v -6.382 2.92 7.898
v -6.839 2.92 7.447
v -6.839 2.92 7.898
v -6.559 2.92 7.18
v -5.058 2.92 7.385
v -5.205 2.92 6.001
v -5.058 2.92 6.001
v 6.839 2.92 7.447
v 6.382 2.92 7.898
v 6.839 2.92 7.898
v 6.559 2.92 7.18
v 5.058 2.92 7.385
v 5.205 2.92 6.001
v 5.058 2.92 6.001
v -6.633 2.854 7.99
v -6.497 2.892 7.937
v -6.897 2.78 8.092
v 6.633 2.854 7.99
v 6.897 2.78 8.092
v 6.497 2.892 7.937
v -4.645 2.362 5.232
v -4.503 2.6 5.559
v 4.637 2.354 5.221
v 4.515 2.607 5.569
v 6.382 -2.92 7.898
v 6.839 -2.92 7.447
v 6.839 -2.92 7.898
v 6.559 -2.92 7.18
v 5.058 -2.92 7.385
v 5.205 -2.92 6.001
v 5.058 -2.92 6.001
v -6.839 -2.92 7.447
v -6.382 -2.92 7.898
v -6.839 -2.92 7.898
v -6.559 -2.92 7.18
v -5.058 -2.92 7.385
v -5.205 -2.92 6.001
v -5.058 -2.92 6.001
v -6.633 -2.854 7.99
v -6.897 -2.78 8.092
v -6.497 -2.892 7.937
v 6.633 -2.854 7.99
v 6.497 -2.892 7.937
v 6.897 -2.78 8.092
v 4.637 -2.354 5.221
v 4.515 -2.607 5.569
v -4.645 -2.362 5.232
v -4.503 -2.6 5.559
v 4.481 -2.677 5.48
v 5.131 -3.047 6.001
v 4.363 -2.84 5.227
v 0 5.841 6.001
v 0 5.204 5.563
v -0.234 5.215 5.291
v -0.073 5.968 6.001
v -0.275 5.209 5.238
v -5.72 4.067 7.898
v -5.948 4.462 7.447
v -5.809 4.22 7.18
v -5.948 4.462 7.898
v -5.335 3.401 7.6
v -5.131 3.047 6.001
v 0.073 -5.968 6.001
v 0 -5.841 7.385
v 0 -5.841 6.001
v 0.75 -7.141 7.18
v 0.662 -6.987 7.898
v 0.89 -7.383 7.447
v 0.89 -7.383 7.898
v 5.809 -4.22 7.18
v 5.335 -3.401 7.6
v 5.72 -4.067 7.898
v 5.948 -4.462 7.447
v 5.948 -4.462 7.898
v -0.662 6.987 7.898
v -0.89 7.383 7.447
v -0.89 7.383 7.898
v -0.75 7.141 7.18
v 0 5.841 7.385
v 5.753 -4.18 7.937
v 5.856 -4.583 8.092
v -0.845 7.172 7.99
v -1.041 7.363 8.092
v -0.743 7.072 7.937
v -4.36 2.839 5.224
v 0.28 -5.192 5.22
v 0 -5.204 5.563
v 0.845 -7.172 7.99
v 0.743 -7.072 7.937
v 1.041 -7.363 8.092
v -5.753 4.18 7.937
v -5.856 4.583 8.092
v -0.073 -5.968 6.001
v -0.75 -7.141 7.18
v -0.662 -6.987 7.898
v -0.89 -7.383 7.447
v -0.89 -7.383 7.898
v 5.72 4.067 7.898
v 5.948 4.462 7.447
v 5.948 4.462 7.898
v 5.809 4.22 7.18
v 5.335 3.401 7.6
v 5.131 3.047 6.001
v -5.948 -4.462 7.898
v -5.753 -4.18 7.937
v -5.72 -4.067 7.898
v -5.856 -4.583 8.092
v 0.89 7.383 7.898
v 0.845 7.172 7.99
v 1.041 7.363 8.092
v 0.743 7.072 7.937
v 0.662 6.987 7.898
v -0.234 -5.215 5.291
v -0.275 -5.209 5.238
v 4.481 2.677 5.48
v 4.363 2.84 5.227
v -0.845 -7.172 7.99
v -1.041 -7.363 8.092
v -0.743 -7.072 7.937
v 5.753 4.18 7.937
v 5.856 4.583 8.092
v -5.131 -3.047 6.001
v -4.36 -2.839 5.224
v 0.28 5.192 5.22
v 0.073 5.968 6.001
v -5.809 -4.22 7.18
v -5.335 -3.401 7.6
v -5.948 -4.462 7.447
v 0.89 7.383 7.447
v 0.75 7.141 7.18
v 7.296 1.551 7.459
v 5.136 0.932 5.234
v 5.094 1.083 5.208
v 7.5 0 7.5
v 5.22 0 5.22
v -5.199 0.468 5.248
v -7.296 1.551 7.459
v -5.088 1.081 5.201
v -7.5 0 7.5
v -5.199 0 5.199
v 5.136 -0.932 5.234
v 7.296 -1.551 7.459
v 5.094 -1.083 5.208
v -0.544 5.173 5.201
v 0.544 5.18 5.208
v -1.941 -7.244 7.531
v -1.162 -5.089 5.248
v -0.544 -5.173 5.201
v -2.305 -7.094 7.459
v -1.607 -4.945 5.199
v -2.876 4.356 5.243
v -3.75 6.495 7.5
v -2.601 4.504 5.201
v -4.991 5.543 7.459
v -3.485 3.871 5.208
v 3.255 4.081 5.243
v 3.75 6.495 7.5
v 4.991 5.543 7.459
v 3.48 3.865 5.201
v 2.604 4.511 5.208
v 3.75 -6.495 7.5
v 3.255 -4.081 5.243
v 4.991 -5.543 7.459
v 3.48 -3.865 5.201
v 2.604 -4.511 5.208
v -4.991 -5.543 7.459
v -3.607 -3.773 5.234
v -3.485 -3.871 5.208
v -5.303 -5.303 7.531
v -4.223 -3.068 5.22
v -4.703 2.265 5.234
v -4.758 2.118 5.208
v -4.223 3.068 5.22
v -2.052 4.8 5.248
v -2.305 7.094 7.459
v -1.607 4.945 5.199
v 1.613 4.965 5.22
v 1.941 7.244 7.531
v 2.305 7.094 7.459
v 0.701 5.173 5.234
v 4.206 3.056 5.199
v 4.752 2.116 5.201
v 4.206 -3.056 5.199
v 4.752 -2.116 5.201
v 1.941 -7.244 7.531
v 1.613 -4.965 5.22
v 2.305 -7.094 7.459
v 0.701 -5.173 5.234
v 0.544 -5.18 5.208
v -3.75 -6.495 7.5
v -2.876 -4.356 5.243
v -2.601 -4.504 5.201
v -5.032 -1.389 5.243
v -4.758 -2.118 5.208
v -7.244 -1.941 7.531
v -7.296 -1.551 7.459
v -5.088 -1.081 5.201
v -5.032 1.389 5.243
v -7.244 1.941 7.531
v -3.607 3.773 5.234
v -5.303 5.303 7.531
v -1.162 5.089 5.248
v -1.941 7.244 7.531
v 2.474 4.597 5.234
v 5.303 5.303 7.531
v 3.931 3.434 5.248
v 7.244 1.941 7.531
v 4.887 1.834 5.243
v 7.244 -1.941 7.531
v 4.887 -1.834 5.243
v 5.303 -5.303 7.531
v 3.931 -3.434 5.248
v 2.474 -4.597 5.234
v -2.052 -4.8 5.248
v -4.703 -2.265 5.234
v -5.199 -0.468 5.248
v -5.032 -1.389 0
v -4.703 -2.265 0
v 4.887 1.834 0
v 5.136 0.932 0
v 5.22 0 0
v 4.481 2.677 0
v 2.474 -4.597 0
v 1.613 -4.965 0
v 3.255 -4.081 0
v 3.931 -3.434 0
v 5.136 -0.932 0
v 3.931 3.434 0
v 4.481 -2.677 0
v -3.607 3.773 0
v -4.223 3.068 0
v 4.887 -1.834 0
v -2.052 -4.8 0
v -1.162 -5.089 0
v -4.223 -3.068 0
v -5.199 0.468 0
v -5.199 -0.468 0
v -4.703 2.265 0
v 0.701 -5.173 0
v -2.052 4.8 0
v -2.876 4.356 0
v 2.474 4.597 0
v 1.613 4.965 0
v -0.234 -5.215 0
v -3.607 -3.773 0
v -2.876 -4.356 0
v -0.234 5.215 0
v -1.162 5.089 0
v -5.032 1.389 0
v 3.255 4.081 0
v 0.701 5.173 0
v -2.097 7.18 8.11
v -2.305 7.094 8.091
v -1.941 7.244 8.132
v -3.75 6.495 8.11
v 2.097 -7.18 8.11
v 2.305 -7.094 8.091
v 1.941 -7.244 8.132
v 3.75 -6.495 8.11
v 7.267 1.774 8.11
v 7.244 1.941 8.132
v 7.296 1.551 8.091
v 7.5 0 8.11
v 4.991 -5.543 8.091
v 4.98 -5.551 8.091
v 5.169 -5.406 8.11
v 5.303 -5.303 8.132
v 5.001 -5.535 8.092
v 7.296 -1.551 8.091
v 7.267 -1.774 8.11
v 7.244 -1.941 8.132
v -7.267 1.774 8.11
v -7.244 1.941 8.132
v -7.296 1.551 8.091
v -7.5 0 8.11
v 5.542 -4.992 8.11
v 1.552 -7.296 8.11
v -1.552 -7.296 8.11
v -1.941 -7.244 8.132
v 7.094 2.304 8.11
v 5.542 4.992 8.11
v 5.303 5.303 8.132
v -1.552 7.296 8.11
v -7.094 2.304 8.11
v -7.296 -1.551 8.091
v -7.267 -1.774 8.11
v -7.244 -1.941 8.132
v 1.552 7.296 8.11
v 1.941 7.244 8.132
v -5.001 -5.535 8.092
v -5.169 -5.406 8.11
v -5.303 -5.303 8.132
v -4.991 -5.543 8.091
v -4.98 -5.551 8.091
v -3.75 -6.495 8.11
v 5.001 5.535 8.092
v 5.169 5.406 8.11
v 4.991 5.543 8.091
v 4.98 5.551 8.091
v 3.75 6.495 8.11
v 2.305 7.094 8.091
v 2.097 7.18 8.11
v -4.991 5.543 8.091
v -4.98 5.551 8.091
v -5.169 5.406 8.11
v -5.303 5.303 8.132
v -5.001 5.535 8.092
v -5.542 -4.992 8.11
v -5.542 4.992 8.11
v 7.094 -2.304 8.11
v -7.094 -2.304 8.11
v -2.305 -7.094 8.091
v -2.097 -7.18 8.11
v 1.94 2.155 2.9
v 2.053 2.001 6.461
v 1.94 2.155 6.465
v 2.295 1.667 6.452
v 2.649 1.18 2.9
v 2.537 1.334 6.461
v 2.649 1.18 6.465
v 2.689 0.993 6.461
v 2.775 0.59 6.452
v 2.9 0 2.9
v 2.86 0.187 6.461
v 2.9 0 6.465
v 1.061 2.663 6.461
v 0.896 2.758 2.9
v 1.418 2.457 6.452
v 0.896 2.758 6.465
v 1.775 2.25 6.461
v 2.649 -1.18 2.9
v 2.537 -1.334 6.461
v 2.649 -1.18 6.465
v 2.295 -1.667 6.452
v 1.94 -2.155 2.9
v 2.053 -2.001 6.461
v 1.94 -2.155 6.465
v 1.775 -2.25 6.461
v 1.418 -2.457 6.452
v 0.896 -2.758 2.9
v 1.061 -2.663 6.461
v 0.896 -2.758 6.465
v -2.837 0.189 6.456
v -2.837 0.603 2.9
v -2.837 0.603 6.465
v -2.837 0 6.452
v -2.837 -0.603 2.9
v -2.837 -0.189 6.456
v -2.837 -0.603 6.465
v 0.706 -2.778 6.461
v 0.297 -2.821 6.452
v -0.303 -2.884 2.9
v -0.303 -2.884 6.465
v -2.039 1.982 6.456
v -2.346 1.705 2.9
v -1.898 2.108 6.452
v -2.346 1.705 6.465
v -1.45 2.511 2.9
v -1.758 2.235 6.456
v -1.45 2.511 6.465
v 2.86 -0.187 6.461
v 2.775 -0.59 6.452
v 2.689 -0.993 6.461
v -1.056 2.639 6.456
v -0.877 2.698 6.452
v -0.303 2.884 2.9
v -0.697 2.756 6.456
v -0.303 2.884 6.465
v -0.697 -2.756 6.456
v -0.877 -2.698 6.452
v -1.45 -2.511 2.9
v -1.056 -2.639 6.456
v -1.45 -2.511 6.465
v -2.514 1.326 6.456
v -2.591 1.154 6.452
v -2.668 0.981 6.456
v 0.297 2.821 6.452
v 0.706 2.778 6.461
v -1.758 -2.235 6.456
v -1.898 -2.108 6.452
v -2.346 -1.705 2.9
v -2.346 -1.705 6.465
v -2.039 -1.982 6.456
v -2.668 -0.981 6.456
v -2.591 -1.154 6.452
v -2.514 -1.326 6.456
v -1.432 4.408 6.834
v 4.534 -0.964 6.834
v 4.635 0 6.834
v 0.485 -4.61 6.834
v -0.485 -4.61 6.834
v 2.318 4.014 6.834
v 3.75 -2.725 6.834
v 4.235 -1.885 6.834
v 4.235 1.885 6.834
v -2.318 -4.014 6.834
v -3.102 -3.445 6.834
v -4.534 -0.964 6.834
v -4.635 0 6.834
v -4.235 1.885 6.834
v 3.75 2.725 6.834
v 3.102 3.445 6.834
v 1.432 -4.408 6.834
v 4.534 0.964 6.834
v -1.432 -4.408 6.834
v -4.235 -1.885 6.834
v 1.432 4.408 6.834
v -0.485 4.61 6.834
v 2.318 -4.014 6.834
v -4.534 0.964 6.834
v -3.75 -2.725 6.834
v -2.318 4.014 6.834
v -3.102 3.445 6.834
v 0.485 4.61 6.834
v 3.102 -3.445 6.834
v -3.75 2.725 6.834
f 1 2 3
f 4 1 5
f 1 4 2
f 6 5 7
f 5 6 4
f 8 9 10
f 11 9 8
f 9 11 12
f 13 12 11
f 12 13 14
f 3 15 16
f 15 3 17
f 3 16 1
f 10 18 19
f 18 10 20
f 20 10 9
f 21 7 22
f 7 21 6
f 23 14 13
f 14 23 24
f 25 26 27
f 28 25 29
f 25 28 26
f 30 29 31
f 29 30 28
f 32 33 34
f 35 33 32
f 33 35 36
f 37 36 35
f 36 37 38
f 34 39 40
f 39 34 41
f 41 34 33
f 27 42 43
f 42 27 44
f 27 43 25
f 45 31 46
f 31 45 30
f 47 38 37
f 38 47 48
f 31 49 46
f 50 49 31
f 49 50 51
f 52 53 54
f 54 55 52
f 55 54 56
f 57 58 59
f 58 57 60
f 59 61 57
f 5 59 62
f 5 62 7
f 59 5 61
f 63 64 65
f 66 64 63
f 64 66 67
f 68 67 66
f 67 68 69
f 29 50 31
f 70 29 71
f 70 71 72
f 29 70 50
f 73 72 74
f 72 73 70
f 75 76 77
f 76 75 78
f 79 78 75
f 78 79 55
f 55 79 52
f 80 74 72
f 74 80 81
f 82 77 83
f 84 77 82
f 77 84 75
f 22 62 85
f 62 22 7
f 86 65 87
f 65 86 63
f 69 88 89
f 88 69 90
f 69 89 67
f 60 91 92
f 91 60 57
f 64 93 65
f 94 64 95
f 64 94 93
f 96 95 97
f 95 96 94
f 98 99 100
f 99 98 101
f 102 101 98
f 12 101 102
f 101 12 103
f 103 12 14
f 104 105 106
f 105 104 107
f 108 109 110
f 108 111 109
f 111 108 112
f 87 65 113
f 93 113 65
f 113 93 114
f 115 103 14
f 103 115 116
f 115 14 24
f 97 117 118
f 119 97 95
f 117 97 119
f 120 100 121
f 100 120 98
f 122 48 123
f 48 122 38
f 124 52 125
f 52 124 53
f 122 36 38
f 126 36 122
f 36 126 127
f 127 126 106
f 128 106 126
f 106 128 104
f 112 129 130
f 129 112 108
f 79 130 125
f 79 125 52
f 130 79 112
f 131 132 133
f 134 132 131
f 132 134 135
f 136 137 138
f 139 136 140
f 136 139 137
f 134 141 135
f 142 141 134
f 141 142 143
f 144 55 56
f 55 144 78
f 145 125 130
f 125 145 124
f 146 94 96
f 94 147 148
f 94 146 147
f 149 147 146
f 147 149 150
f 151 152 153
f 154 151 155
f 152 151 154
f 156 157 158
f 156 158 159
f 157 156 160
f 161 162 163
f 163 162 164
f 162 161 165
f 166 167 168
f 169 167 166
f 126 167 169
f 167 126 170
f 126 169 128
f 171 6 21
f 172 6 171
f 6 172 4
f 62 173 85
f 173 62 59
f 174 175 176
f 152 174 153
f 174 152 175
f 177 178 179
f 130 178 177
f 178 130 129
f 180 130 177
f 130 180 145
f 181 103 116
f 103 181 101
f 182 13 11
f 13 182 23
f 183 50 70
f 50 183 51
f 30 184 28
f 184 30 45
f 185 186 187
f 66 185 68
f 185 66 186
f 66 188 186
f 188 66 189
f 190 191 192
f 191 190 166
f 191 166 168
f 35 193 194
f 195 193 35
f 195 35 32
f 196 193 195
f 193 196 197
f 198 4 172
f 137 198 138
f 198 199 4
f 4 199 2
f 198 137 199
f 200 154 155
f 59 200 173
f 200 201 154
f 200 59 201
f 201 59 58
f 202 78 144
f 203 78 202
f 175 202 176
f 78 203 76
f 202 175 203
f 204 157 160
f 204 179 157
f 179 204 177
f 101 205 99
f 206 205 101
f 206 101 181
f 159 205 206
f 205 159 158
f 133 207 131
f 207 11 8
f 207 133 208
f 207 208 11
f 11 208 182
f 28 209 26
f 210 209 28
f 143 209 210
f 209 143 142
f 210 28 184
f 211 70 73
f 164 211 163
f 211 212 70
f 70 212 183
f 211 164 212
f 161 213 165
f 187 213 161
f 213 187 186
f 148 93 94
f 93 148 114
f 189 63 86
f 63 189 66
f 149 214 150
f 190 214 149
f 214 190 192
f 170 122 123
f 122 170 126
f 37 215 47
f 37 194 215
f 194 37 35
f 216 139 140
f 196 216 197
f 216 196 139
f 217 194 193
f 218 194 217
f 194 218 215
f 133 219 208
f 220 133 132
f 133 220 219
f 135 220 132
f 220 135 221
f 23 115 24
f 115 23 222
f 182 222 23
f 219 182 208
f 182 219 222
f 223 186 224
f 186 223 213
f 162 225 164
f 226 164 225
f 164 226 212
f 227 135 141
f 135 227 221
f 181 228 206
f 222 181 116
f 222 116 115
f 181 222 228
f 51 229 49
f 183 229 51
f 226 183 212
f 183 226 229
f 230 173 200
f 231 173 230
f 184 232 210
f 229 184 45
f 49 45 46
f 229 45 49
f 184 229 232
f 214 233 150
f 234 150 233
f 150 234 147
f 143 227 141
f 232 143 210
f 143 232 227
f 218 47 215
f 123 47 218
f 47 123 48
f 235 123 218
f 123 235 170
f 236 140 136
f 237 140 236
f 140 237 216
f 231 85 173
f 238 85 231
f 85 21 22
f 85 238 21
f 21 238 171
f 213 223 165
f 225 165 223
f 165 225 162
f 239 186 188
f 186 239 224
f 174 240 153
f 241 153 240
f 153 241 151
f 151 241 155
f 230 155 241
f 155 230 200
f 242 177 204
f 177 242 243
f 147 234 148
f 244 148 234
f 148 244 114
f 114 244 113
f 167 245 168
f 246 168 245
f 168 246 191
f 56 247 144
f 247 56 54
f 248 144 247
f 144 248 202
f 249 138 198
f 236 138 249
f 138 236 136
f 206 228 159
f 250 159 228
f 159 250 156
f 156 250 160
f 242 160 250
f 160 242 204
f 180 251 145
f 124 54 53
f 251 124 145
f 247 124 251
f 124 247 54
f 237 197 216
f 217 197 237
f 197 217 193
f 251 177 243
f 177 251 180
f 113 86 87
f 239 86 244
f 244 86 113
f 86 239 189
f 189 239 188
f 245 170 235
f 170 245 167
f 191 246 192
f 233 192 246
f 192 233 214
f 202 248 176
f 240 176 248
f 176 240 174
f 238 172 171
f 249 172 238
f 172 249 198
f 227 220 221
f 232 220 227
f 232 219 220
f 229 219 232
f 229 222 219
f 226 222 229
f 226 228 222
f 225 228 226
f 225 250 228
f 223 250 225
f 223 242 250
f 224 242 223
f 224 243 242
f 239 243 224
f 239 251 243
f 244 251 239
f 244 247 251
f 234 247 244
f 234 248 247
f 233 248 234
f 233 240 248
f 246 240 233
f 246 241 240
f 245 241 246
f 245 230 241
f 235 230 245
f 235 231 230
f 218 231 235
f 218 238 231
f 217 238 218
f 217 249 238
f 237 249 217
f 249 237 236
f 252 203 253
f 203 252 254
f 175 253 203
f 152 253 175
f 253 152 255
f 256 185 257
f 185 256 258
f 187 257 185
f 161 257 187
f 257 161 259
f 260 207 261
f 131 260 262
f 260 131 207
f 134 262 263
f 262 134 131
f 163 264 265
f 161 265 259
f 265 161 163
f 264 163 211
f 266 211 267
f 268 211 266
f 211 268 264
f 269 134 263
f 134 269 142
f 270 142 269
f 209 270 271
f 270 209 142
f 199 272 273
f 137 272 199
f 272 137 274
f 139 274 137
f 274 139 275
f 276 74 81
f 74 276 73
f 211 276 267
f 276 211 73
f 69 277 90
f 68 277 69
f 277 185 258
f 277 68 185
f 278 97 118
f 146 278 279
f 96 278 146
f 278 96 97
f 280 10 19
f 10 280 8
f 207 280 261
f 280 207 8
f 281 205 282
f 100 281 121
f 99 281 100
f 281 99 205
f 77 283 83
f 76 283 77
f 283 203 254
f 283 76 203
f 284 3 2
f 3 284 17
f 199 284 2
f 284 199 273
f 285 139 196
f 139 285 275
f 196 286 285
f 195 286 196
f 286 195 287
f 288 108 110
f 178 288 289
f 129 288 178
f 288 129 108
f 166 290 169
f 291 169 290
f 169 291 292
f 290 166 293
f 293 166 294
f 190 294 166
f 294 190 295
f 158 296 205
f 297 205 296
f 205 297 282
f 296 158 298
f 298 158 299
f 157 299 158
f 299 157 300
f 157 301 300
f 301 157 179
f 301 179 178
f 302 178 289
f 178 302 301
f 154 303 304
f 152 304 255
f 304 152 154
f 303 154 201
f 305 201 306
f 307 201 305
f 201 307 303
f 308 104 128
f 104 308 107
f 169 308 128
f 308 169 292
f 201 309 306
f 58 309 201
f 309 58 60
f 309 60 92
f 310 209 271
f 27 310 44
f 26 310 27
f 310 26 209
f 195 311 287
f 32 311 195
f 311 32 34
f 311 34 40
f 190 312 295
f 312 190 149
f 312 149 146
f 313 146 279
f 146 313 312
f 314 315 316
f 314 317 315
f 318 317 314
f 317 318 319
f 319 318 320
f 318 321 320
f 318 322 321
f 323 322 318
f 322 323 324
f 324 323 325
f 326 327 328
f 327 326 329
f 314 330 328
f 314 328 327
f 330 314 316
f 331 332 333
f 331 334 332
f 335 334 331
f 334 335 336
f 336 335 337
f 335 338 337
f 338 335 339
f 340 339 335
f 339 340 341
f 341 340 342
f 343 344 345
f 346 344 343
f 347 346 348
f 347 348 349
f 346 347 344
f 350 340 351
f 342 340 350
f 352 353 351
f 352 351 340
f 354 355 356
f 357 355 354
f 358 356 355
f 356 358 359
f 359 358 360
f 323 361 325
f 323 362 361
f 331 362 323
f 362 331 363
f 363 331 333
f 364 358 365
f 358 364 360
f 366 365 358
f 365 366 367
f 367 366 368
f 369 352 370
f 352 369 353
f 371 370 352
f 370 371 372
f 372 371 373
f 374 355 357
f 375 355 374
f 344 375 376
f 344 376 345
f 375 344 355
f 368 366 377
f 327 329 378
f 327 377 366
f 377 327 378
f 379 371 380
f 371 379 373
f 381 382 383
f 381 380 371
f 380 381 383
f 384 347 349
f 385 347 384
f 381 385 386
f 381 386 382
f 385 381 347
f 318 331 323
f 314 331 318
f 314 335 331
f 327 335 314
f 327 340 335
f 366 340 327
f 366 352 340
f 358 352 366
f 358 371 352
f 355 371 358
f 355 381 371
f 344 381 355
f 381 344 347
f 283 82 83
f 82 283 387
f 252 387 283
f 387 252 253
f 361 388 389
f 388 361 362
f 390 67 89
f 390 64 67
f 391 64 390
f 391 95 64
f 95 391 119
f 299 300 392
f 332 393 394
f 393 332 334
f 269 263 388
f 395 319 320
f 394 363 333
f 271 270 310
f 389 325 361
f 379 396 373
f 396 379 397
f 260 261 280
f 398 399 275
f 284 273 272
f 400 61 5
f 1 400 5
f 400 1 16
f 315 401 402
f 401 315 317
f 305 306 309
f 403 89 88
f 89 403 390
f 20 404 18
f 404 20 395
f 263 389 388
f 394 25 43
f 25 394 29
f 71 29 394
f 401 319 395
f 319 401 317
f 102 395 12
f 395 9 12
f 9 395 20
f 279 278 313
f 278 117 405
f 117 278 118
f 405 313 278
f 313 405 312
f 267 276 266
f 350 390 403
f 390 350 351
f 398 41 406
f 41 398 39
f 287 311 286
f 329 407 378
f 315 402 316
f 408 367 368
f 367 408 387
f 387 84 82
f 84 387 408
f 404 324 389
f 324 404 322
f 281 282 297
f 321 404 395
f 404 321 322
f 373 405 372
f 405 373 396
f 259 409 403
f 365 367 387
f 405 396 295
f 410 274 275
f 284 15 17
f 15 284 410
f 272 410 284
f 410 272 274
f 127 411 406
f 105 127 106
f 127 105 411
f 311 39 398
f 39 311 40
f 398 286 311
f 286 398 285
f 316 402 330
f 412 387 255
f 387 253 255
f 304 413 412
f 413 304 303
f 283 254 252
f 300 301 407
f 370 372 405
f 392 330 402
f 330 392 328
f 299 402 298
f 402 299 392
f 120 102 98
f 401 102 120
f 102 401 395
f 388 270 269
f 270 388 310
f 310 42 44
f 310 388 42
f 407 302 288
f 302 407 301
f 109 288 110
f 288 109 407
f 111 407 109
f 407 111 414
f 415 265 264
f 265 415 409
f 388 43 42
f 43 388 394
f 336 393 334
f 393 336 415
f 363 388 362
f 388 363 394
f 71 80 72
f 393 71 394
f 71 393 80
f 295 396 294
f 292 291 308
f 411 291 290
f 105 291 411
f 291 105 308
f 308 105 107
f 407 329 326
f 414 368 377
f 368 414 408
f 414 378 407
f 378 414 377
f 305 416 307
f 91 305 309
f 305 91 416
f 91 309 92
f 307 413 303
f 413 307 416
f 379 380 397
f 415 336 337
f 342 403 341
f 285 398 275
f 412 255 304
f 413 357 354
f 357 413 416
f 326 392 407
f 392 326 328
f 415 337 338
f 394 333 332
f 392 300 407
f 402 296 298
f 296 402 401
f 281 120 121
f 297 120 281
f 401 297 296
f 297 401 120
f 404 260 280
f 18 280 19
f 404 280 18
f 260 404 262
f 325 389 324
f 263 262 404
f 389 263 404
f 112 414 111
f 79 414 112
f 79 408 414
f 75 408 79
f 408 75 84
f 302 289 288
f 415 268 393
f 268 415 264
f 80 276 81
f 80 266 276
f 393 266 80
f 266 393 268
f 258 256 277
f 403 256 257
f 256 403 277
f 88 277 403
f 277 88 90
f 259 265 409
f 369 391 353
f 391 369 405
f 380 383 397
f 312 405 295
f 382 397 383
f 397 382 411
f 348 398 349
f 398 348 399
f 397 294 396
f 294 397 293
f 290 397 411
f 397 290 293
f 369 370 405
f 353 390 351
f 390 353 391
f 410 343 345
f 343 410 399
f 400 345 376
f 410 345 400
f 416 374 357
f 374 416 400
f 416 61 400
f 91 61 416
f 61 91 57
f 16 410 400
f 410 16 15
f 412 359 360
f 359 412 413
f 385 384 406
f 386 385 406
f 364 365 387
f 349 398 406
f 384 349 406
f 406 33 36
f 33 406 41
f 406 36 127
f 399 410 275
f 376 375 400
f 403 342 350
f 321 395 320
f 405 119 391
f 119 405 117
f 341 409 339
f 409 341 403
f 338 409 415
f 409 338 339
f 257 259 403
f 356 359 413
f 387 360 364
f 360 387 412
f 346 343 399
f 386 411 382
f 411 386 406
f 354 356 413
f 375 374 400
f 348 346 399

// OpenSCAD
// Birthday candle holder by teejaydub

// preview[view:north, tilt:top]
/* [Global] */

// The diameter of the birthday candle [mm]
CANDLE_DIAMETER = 5.8;  //first try: 5.3, too small; 5.5 - 5.7, works but tight

// The outer diameter of the candle holder [mm]
OUTER_DIAMETER = 15;

/* [Hidden] */

CANDLE_RADIUS = CANDLE_DIAMETER / 2;
OUTER_RADIUS = OUTER_DIAMETER / 2;

HOLE_HEIGHT = CANDLE_RADIUS * 5;  // of the cutting hole object
CANDLE_HEIGHT = CANDLE_RADIUS;  // height of the candle above the floor
CANDLE_DEPTH = CANDLE_RADIUS * 1;  // how much the candle is buried in the holder

BASE_HEIGHT = CANDLE_HEIGHT + CANDLE_DEPTH;  // of the base object
BASE_RADIUS = CANDLE_RADIUS * 1.8;

PETAL_RADIUS = BASE_RADIUS / 1.7;

BOWL_RADIUS = OUTER_DIAMETER;

difference() {
	intersection() {
		union() {
			// Base
			translate([0, 0, BASE_HEIGHT / 2])
				cylinder(h = BASE_HEIGHT, r = BASE_RADIUS, center = true, $fn=35);
	
			// Flowers
			intersection() {
				union() {
					petal(0);
					petal(120);
					petal(240);
				}

				// Enforce a 45-degree angle on the petals so no support is needed.
				translate([0, 0, 50])
					cylinder(h = 100, r1 = 0, r2 = 100, center = true);
			}
		}

		// We want a circular outline.
		cylinder(h = 100, r = OUTER_RADIUS, center = true);
	}

	// Hole for the candle
	translate([0, 0, CANDLE_HEIGHT + HOLE_HEIGHT / 2])
		cylinder(h = HOLE_HEIGHT, r = CANDLE_RADIUS, center = true, $fn=15);

	// Shallow bowl
	translate([0, 0, BOWL_RADIUS + BASE_HEIGHT + 0.3])
		sphere(r = BOWL_RADIUS, center = true);
}

module petal(angle) {
	translate([0, 0, BASE_HEIGHT + PETAL_RADIUS * 0.7 - 1])
	rotate([0, 90, angle])
		cylinder(h = OUTER_DIAMETER, r = PETAL_RADIUS, center = true);
}
